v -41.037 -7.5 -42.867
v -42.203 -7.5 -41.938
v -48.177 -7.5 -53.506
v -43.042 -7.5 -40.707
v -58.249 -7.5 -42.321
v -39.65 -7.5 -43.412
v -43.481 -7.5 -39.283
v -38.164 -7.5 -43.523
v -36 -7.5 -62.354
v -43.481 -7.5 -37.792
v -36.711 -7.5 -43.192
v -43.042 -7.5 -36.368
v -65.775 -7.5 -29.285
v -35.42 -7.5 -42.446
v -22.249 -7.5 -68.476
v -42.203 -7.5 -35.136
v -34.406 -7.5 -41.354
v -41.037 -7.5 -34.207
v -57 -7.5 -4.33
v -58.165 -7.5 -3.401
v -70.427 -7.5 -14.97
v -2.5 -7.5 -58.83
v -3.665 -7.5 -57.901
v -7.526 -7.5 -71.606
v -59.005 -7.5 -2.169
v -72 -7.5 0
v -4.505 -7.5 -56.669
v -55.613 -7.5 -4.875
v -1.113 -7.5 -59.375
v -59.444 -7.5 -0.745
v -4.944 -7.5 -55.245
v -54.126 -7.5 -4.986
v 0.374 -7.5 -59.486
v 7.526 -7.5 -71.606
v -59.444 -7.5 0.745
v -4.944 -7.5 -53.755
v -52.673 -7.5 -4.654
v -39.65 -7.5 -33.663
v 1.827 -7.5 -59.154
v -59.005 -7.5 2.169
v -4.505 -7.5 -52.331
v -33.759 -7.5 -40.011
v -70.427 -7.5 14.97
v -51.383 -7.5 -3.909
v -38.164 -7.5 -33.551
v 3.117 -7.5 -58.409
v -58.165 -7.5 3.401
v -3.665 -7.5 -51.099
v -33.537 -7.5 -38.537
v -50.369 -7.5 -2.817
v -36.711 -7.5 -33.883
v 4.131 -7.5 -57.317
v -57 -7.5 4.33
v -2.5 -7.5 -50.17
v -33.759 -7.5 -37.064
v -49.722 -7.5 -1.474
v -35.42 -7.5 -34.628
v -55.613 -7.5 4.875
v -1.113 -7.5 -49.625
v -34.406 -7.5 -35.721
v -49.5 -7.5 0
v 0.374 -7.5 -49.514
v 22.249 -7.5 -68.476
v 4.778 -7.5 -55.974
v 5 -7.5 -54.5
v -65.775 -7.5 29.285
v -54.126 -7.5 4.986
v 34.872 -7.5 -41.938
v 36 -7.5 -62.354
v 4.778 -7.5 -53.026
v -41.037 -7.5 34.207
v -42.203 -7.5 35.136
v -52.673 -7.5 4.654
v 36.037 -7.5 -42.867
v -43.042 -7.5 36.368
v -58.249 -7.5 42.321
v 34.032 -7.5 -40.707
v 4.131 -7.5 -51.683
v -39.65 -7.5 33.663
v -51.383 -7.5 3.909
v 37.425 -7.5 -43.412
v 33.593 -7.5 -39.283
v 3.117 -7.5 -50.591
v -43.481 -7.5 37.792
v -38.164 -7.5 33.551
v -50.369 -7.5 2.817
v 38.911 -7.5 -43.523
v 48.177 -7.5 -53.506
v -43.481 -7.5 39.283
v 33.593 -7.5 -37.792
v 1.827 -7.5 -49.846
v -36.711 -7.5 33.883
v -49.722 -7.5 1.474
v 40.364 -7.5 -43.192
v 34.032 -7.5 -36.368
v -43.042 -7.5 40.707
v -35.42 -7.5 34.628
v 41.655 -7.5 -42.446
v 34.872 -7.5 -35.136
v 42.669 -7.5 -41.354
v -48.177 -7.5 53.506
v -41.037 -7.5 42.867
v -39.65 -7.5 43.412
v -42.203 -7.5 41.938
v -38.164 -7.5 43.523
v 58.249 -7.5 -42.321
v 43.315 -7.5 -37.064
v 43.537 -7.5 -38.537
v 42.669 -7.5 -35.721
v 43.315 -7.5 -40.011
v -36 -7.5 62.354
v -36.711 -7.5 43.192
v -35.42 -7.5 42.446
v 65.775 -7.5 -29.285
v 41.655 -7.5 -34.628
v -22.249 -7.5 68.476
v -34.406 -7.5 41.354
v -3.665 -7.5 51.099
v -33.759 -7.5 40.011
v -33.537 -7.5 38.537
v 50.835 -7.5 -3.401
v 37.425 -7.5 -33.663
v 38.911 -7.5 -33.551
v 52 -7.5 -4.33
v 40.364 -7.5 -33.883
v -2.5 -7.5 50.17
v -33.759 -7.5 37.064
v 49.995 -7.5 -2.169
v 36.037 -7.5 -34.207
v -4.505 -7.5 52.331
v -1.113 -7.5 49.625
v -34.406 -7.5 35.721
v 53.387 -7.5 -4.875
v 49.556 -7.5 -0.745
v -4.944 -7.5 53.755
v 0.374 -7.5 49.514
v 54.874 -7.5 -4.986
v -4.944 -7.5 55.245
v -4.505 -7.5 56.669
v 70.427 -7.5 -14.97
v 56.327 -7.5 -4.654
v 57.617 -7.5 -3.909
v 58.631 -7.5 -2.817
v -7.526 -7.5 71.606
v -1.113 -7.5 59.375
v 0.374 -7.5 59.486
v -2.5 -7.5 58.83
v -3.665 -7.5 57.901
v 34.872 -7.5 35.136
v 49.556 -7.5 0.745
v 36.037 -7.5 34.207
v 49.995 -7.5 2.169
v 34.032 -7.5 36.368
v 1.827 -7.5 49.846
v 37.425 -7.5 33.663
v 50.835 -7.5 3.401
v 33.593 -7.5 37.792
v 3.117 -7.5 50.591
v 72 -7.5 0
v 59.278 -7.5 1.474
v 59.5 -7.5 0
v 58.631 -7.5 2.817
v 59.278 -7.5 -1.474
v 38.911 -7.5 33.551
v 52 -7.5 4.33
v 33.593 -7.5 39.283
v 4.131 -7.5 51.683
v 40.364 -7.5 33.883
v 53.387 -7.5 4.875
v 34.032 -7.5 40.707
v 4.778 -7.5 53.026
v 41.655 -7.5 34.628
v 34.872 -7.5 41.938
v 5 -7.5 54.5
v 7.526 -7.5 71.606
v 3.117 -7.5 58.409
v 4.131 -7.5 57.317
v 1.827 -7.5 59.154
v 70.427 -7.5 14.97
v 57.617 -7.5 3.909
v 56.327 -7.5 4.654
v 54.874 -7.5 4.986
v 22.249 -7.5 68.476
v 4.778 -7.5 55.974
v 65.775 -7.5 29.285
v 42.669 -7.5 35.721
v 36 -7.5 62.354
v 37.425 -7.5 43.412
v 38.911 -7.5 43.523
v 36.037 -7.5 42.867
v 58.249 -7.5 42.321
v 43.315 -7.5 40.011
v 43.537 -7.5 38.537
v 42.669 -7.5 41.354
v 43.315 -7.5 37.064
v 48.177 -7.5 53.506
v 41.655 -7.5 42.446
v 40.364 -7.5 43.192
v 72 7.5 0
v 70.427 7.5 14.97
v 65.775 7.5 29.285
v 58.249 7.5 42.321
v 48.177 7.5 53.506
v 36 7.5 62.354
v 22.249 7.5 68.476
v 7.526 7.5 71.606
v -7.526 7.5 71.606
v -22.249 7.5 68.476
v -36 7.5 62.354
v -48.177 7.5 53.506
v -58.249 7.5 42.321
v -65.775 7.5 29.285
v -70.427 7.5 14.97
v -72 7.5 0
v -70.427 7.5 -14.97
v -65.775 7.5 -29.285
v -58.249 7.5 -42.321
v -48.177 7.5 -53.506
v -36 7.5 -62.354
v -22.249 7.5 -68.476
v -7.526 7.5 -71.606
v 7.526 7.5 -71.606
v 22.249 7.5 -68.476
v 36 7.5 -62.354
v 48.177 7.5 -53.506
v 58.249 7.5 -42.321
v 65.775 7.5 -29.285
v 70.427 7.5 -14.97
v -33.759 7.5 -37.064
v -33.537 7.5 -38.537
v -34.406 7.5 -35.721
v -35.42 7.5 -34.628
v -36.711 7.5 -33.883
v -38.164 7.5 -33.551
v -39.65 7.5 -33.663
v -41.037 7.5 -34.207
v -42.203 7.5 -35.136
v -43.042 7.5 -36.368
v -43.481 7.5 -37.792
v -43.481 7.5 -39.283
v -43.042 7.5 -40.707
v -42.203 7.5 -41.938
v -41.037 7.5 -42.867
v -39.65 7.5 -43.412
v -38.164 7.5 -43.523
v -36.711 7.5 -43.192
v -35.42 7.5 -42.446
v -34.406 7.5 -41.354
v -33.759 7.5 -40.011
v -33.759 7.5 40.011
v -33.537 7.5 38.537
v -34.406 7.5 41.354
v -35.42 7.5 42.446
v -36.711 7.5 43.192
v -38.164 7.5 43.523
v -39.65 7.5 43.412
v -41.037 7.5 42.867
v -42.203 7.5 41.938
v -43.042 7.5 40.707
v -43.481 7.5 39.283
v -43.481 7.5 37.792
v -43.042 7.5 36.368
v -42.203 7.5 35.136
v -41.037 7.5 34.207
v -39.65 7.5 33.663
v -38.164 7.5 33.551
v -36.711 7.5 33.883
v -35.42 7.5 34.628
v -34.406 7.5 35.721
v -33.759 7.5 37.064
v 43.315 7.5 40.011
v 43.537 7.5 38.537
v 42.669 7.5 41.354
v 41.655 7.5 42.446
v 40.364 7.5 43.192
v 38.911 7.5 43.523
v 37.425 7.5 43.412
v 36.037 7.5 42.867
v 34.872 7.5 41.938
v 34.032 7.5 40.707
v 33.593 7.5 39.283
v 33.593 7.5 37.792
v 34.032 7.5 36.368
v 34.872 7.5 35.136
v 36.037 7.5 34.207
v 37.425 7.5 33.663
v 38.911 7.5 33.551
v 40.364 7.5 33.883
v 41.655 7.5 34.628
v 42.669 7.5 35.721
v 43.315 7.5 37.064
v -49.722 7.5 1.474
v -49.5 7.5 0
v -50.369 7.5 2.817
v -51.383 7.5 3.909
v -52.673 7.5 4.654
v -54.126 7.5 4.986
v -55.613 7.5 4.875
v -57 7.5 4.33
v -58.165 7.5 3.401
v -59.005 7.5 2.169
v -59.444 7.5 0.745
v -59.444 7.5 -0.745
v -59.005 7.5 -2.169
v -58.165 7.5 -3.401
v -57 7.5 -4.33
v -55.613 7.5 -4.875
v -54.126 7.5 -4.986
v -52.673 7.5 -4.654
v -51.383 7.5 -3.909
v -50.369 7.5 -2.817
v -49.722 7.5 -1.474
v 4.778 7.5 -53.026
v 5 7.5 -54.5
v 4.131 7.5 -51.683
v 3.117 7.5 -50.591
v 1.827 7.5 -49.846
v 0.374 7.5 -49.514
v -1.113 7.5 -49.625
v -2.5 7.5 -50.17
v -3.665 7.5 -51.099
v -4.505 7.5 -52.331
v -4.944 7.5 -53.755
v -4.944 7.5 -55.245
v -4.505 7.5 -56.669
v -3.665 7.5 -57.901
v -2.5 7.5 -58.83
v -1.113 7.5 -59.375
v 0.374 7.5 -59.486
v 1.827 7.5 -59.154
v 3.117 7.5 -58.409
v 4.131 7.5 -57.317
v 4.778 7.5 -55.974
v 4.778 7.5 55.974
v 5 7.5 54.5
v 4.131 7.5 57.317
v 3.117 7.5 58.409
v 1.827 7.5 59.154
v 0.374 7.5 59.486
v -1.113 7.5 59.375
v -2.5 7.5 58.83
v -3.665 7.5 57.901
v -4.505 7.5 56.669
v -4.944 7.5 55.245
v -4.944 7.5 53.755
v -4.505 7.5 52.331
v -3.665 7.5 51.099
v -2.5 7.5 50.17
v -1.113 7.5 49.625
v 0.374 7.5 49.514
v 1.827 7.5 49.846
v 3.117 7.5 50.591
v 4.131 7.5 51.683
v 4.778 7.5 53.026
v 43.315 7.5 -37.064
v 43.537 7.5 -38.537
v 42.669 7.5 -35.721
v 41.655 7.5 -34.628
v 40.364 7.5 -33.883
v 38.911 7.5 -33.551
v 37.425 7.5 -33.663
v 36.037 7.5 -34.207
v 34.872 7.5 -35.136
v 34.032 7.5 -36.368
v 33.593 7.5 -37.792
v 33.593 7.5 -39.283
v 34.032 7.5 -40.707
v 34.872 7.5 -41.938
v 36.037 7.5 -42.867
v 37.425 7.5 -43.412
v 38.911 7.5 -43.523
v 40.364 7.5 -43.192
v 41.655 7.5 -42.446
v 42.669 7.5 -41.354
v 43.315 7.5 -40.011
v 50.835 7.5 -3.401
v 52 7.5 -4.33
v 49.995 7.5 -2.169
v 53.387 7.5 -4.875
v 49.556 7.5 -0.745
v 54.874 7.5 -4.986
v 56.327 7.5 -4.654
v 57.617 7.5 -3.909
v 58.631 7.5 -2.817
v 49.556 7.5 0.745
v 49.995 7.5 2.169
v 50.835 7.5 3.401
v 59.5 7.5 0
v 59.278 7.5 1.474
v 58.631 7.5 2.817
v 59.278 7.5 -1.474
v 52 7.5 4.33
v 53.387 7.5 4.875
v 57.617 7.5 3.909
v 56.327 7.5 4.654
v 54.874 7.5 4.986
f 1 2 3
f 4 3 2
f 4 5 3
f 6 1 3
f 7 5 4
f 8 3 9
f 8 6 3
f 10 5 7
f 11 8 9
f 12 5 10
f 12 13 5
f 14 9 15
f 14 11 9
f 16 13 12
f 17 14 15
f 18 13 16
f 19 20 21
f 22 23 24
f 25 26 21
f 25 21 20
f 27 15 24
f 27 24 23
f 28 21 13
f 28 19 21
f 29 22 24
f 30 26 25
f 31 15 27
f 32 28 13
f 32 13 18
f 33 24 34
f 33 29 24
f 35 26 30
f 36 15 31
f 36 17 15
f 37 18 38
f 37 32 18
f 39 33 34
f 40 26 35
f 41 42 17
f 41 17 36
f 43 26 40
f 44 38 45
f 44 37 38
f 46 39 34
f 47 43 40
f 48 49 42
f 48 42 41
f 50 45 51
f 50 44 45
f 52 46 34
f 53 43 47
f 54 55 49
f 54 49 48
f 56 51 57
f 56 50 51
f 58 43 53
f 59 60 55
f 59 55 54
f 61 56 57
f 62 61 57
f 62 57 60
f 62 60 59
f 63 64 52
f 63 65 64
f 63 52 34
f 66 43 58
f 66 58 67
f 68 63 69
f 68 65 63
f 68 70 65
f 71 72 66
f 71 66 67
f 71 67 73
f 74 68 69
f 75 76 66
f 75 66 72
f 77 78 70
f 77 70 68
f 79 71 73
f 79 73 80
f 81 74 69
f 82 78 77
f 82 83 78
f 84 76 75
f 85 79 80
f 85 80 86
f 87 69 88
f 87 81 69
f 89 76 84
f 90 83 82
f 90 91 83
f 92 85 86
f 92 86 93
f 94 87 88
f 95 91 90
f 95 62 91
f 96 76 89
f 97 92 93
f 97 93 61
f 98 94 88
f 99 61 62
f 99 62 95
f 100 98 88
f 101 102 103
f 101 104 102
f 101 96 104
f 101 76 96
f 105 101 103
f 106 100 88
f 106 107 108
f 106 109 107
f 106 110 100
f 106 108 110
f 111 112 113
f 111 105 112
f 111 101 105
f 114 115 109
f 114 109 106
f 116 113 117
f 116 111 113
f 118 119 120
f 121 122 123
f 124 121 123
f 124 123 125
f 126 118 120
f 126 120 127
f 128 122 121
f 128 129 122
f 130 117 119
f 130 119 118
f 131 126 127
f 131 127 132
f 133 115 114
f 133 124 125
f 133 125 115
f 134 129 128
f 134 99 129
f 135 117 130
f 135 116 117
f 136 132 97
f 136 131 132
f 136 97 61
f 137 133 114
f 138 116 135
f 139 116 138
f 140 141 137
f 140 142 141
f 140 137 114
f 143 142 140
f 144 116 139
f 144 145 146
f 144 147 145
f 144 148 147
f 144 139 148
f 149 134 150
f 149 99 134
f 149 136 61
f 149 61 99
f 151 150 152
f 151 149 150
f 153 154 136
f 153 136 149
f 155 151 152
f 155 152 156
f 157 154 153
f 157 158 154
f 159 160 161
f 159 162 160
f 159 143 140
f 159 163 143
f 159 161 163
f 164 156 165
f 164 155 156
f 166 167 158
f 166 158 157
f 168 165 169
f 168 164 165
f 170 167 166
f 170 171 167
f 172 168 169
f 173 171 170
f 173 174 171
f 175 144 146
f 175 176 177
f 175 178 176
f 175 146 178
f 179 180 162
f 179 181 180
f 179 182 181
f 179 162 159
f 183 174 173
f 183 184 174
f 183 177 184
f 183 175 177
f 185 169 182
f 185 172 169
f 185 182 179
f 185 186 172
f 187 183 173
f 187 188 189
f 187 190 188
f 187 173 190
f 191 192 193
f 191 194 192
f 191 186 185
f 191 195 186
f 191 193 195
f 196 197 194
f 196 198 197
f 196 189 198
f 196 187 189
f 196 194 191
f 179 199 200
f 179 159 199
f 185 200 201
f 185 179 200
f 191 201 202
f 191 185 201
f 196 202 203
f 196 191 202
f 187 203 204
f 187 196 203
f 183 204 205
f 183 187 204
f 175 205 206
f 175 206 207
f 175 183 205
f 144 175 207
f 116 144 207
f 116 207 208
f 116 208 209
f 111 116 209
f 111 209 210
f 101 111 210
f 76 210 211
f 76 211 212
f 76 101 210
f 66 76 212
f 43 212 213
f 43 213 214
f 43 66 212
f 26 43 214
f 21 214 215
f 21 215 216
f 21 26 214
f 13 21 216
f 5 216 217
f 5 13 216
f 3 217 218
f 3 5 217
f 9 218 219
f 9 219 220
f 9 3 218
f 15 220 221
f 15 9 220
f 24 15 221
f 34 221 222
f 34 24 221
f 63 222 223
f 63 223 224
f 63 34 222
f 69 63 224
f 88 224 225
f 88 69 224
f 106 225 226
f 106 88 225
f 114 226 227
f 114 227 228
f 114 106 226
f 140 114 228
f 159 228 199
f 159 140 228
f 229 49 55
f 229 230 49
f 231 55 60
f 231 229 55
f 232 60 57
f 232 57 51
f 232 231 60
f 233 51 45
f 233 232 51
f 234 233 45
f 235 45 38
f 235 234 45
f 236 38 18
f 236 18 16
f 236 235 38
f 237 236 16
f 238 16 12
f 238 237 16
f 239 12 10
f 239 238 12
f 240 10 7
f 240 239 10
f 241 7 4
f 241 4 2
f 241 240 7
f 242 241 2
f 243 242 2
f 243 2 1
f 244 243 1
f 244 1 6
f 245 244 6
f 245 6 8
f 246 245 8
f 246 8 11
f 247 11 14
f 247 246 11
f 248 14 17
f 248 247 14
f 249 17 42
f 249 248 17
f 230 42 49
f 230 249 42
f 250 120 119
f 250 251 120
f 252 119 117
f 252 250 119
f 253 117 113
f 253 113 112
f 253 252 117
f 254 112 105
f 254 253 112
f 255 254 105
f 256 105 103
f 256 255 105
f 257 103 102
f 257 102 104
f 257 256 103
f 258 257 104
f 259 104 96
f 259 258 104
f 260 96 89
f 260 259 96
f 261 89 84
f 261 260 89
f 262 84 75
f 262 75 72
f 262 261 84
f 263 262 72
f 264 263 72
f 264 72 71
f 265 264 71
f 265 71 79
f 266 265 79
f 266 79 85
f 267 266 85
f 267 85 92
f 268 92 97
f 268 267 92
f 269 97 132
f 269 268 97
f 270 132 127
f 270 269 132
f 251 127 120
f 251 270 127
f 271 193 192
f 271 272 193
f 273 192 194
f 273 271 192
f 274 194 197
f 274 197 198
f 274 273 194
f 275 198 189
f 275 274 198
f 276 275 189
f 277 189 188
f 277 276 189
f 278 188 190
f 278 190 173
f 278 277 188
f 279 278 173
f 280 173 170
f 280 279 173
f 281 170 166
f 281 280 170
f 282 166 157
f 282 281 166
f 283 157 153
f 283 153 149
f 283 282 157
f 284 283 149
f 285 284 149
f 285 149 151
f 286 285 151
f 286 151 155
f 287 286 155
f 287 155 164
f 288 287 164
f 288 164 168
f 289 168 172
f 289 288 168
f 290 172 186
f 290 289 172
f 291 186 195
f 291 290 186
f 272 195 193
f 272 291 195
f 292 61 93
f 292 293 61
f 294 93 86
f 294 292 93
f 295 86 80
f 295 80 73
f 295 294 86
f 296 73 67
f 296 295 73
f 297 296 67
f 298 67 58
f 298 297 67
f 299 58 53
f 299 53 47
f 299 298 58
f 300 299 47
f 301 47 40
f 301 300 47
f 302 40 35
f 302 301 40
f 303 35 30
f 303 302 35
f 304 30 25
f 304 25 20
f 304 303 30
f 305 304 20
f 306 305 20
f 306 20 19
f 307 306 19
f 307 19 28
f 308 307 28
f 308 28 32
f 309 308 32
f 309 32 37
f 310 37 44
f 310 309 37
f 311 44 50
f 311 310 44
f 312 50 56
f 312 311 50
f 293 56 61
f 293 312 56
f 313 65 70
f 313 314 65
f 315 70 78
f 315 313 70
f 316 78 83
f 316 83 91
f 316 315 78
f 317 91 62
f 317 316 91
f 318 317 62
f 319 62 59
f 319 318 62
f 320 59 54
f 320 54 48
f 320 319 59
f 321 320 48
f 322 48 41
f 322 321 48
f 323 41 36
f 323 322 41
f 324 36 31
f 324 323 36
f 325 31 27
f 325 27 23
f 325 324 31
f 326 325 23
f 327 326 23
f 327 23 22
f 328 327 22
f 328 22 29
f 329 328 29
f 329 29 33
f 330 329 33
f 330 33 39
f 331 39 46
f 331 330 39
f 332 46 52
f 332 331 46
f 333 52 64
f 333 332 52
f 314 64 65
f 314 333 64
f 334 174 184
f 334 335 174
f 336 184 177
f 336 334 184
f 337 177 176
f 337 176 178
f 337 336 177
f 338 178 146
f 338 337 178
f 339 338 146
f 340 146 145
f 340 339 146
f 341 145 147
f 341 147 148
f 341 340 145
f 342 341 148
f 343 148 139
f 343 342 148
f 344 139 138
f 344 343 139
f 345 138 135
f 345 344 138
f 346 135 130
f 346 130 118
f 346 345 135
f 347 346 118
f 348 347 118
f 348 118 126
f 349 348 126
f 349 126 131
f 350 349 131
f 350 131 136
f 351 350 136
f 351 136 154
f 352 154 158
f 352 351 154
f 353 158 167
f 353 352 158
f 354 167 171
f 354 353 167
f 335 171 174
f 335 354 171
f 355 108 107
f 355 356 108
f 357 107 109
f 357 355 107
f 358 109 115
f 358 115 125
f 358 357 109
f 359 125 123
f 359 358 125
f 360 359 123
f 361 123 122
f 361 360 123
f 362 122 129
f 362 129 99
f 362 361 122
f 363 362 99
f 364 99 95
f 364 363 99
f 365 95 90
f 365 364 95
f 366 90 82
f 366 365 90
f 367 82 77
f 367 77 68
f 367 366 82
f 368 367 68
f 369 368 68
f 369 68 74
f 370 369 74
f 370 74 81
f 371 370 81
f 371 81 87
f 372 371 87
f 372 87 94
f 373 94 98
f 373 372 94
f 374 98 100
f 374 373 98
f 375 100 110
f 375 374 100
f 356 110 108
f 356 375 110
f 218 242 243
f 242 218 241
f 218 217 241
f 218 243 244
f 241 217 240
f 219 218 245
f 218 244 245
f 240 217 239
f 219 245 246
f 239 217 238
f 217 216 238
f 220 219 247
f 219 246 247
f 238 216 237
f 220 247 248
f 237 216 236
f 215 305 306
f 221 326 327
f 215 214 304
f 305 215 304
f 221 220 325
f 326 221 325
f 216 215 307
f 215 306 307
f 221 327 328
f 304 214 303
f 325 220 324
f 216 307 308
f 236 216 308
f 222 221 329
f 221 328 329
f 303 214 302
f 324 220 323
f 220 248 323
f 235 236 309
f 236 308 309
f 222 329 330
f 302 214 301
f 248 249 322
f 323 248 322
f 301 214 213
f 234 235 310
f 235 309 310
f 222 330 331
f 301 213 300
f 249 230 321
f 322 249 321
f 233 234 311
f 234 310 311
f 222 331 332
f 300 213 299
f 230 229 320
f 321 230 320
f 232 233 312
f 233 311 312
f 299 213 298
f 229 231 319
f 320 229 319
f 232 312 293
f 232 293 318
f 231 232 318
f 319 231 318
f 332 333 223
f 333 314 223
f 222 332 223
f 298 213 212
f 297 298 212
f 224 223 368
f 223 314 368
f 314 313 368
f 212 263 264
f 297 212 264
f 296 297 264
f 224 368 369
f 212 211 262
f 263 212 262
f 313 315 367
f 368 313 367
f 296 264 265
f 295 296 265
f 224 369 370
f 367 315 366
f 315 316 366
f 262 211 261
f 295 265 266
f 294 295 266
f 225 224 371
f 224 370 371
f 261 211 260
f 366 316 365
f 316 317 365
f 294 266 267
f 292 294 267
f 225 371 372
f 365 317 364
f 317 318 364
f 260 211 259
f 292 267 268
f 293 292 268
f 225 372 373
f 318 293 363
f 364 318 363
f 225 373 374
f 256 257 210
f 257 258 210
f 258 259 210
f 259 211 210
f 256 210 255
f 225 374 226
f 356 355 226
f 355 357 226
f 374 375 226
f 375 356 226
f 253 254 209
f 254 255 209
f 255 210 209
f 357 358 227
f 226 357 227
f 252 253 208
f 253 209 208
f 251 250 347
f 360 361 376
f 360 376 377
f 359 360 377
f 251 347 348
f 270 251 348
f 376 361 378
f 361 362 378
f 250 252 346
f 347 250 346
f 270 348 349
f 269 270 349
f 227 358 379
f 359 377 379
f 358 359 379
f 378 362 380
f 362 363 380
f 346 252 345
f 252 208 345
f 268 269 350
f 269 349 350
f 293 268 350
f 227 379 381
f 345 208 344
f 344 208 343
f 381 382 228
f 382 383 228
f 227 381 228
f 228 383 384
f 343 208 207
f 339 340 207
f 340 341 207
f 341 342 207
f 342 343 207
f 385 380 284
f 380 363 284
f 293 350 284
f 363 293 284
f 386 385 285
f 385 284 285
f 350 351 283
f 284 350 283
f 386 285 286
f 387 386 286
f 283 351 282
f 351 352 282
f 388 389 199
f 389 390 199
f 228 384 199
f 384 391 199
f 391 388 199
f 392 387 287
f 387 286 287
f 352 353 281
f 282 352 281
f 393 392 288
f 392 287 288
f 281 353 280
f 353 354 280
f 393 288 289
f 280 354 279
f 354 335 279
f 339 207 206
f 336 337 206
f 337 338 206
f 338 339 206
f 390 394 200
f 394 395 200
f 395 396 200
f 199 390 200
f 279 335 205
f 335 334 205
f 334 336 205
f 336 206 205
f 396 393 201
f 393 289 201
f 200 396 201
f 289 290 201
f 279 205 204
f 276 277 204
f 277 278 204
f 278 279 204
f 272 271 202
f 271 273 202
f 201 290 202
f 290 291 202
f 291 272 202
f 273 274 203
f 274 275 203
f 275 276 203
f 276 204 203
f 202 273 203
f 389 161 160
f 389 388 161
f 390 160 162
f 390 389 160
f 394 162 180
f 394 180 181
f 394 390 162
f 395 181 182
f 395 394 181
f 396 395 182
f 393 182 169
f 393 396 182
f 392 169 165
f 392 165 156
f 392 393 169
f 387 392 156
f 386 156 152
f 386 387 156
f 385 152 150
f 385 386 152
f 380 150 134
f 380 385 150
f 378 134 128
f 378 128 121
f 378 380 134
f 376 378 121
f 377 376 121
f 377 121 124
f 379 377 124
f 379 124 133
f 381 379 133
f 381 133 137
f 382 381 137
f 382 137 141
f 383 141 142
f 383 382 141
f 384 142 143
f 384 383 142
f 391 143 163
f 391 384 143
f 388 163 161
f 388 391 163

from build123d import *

# Parameters (mm, degrees)
F0_R     = 72
F0_R_2   = 5
F1_DEPTH = 7.5


with BuildPart() as f1:
    # F0 (on Front) → F1 (new body, symmetric)
    with BuildSketch(Plane.XZ):
        Circle(F0_R)
        with Locations((-38.53732, -38.53732)):
            Circle(F0_R_2, mode=Mode.SUBTRACT)
        with Locations((0, -54.5)):
            Circle(F0_R_2, mode=Mode.SUBTRACT)
        with Locations((38.53732, -38.53732)):
            Circle(F0_R_2, mode=Mode.SUBTRACT)
        with Locations((-54.5, 0)):
            Circle(F0_R_2, mode=Mode.SUBTRACT)
        with Locations((-38.53732, 38.53732)):
            Circle(F0_R_2, mode=Mode.SUBTRACT)
        with Locations((54.5, 0)):
            Circle(F0_R_2, mode=Mode.SUBTRACT)
        with Locations((0, 54.5)):
            Circle(F0_R_2, mode=Mode.SUBTRACT)
        with Locations((38.53732, 38.53732)):
            Circle(F0_R_2, mode=Mode.SUBTRACT)
    extrude(amount=F1_DEPTH, both=True)


solid = f1.part
